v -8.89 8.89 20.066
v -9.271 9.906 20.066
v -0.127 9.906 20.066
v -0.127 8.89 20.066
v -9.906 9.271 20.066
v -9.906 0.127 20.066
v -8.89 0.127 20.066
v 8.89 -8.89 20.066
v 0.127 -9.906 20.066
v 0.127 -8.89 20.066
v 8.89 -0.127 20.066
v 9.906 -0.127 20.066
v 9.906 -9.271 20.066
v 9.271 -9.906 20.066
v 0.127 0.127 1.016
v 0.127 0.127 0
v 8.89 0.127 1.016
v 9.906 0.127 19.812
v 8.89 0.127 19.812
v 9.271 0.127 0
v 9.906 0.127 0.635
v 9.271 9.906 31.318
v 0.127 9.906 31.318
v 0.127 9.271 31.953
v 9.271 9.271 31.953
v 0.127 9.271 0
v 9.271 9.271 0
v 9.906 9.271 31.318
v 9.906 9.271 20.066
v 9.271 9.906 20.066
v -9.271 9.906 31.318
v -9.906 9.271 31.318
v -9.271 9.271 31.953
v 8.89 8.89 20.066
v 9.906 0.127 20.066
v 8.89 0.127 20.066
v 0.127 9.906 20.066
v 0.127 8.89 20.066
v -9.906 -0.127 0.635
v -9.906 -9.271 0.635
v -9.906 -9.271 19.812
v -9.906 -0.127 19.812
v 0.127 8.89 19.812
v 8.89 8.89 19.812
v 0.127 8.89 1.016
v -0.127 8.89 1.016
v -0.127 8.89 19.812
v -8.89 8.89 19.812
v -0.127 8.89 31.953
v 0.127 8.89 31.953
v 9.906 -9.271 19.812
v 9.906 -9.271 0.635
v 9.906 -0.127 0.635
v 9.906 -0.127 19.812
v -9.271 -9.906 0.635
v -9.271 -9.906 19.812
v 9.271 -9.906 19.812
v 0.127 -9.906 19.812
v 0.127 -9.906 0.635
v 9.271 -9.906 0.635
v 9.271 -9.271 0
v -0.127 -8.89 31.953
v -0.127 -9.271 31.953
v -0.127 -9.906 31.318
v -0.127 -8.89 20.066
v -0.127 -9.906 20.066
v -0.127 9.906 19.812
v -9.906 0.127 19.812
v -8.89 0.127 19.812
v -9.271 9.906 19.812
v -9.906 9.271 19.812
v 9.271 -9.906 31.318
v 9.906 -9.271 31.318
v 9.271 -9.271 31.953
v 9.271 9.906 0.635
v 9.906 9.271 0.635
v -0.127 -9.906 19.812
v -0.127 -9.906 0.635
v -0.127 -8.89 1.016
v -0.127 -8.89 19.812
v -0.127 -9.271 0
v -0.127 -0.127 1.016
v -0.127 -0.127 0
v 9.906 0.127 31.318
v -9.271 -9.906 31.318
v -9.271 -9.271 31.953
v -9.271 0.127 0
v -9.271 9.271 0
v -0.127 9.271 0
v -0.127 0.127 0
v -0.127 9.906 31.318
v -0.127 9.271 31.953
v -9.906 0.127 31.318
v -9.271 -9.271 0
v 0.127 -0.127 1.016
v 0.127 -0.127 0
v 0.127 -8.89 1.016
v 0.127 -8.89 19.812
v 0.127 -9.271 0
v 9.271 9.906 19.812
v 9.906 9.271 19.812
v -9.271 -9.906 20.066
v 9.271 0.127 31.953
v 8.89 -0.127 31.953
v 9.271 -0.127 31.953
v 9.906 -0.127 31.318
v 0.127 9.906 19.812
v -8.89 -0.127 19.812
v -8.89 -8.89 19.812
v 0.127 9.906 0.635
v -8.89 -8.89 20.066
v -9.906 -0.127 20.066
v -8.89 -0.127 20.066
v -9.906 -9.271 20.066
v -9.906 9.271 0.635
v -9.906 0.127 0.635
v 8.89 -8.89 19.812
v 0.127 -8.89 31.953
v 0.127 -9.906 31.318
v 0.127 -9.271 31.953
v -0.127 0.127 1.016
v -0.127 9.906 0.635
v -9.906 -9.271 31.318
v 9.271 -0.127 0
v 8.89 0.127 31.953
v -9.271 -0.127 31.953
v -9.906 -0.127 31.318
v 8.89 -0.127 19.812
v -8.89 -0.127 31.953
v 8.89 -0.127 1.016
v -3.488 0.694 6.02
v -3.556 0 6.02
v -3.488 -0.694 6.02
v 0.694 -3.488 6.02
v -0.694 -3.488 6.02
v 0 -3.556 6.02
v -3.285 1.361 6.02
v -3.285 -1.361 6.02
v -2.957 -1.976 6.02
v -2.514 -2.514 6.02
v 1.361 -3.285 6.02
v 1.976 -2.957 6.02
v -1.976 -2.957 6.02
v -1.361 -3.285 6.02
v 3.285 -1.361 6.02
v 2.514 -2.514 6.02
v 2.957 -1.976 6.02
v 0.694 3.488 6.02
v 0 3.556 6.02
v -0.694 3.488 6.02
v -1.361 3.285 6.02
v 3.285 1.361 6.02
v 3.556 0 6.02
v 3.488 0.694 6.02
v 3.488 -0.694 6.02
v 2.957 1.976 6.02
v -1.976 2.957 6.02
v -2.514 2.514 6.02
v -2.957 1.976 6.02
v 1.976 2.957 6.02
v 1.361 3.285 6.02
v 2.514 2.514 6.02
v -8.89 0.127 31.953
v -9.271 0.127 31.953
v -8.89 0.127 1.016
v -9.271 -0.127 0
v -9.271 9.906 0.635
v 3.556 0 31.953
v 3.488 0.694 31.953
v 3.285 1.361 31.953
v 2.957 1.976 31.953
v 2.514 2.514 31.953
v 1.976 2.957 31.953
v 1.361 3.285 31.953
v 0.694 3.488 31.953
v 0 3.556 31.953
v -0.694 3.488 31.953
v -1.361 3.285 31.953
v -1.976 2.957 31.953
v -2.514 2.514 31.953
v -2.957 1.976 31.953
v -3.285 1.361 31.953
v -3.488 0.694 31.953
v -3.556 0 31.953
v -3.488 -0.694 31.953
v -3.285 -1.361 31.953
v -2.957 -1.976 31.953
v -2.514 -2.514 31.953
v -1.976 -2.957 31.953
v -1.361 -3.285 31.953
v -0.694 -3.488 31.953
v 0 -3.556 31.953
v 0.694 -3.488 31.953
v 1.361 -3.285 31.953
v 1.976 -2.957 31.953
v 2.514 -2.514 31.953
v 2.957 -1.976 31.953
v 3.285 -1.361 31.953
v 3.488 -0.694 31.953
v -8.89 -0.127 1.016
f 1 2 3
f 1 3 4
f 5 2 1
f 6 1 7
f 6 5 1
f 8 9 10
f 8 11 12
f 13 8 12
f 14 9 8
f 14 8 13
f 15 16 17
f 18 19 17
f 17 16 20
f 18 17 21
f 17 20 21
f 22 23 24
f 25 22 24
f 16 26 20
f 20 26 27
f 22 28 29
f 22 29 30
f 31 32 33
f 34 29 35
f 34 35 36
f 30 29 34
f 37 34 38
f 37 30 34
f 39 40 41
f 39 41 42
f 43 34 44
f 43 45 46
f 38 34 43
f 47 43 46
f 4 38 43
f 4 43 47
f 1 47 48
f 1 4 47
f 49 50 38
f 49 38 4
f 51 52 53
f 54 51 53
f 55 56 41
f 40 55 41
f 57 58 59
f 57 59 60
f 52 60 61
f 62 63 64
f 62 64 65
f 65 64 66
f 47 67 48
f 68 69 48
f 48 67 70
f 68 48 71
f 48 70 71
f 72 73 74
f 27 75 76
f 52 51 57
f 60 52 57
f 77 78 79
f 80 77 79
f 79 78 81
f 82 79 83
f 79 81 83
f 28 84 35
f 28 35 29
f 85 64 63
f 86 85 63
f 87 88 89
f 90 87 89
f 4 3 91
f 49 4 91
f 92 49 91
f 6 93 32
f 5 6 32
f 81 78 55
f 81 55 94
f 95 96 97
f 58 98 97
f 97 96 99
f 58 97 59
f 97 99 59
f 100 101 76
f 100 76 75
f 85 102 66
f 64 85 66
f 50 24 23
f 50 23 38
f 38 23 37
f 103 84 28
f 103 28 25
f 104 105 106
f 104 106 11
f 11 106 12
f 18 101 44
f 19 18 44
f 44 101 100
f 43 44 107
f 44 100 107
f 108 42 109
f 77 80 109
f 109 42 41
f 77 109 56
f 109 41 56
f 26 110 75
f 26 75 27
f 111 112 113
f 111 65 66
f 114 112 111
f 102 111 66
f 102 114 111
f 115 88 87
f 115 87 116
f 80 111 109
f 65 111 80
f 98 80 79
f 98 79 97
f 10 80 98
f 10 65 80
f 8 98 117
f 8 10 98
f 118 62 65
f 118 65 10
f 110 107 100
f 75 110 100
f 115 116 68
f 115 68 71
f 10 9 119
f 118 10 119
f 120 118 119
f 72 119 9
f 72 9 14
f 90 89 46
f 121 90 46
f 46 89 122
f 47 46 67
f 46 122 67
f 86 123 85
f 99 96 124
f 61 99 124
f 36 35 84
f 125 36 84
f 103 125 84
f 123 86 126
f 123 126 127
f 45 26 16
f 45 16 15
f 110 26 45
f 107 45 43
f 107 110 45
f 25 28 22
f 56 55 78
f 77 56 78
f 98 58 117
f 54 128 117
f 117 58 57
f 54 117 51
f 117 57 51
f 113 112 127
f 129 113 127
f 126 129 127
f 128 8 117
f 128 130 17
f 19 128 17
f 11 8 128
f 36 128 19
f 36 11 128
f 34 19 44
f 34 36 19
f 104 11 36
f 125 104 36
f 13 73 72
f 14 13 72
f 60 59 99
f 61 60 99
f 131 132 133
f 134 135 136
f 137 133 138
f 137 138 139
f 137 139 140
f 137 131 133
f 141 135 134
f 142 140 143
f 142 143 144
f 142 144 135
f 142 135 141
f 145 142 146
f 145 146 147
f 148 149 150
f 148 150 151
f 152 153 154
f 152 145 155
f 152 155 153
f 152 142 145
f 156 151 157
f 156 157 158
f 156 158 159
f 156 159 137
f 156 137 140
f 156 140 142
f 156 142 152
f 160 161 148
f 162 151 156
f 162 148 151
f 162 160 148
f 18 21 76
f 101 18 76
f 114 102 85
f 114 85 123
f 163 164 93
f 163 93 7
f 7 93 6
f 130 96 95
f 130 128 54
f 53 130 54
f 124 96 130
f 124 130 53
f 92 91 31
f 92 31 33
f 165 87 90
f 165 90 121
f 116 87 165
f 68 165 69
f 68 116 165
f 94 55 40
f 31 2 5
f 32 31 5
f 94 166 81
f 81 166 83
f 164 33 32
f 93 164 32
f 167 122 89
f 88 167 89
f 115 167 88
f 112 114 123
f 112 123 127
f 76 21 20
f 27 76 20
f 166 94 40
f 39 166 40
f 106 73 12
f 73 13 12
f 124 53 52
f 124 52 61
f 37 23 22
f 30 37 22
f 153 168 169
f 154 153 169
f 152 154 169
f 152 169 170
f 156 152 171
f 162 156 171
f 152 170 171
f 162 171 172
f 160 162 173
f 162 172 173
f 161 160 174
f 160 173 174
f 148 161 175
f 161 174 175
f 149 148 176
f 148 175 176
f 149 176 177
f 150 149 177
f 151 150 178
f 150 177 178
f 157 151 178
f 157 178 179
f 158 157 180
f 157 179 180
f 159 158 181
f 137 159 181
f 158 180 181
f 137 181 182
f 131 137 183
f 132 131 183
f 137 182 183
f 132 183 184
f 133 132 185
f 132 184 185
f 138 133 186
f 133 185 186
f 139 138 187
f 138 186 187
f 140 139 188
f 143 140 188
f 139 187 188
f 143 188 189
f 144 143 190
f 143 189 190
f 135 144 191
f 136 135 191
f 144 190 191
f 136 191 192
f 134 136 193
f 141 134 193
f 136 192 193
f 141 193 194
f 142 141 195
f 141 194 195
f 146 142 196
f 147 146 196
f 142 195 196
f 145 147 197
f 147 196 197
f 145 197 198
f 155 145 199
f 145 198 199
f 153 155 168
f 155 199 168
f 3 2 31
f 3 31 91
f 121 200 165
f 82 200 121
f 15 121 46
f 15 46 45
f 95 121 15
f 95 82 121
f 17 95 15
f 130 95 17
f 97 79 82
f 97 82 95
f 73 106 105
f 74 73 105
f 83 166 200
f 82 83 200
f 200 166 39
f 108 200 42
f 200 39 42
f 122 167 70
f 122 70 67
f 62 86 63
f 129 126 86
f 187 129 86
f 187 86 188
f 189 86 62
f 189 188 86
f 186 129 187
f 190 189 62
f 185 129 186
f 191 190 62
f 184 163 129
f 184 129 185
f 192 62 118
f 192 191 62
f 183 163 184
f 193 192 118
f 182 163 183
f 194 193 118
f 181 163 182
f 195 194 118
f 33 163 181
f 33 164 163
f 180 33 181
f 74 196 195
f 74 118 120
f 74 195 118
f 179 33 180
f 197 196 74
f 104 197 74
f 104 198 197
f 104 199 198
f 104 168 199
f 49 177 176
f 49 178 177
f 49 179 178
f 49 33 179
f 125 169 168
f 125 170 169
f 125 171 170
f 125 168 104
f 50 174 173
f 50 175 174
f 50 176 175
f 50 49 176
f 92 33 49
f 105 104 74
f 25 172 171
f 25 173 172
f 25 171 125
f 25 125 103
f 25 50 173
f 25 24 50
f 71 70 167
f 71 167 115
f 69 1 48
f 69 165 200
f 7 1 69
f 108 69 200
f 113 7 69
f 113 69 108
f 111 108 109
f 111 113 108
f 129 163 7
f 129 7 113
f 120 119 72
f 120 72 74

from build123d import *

# Parameters (mm, degrees)
F0_W            = 19.812
F0_H            = 19.812
F1_DEPTH        = 31.9532
F2_R            = 3.556
F3_DEPTH        = 25.9334
F4_T1_DEPTH     = 0.8065583261
F4_T3_DEPTH     = 0.8065583261
F4_T5_DEPTH     = 0.8065583261
F4_T7_DEPTH     = 0.8065583261
F4_T9_DEPTH     = 0.8065583261
F4_T11_DEPTH    = 0.8065583261
F4_T13_DEPTH    = 0.8065583261
F4_T15_DEPTH    = 0.8065583261
F4_T17_DEPTH    = 35.2192373947
F4_T19_DEPTH    = 23.0780373947
F4_T21_DEPTH    = 23.0780373947
F5_W            = 0.254
F5_H            = 11.8872
F5_H_2          = 0.254
F5_W_2          = 9.779
F5_H_3          = 19.812
F6_DEPTH        = 1.016
F6_COPIES_COUNT = 4
F7_W            = 0.254
F7_H            = 8.763
F7_H_2          = 0.254
F7_W_2          = 8.763
F8_DEPTH        = 1.016


# Not quite as in the source:
# - a fillet or chamfer that OpenCascade refuses, or shapes differently, is made with other operations: its cross-section is extruded or revolved along the edge and cut away or added
# - a pattern or mirror of a feature is missing from the dataset's text; its kind, count and spacing are read off the source's solid


with BuildPart() as f1:
    # F0 (on Top) → F1 (new body)
    with BuildSketch(Plane.XY):
        Rectangle(F0_W, F0_H)
    extrude(amount=F1_DEPTH)

    # F2 (on face) → F3 (cut)
    with BuildSketch(Plane.XY.offset(31.9532)):
        Circle(F2_R)
    extrude(amount=-F3_DEPTH, mode=Mode.SUBTRACT)

    # F4: chamfer of 0.635 on 12 edges, made by hand

    # F4_s2 → F4_t1 (cut)
    with BuildSketch(Plane(origin=(-6.1806666667, 6.1806666667, -6.1806666667), x_dir=(-0.7071067812, -0.7071067812, 0), z_dir=(-0.5773502692, 0.5773502692, -0.5773502692))):
        Polygon((-0.4490128061, 8.3474527951), (0, 7.5697398018), (0.4490128061, 8.3474527951), align=None)
    extrude(amount=F4_T1_DEPTH, mode=Mode.SUBTRACT)

    # F4_s4 → F4_t3 (cut)
    with BuildSketch(Plane(origin=(-16.8317333333, 16.8317333333, 16.8317333333), x_dir=(-0.7071067812, -0.7071067812, 0), z_dir=(-0.5773502692, 0.5773502692, 0.5773502692))):
        Polygon((-0.4490128061, 17.7422257546), (0, 18.5199387479), (0.4490128061, 17.7422257546), align=None)
    extrude(amount=F4_T3_DEPTH, mode=Mode.SUBTRACT)

    # F4_s6 → F4_t5 (cut)
    with BuildSketch(Plane(origin=(-6.1806666667, -6.1806666667, -6.1806666667), x_dir=(0.7071067812, -0.7071067812, 0), z_dir=(-0.5773502692, -0.5773502692, -0.5773502692))):
        Polygon((0.4490128061, 8.3474527951), (0, 7.5697398018), (-0.4490128061, 8.3474527951), align=None)
    extrude(amount=F4_T5_DEPTH, mode=Mode.SUBTRACT)

    # F4_s8 → F4_t7 (cut)
    with BuildSketch(Plane(origin=(-16.8317333333, -16.8317333333, 16.8317333333), x_dir=(0.7071067812, -0.7071067812, 0), z_dir=(-0.5773502692, -0.5773502692, 0.5773502692))):
        Polygon((0.4490128061, 17.7422257546), (0, 18.5199387479), (-0.4490128061, 17.7422257546), align=None)
    extrude(amount=F4_T7_DEPTH, mode=Mode.SUBTRACT)

    # F4_s10 → F4_t9 (cut)
    with BuildSketch(Plane(origin=(6.1806666667, -6.1806666667, -6.1806666667), x_dir=(0.7071067812, 0.7071067812, 0), z_dir=(0.5773502692, -0.5773502692, -0.5773502692))):
        Polygon((0.4490128061, 8.3474527951), (-0.4490128061, 8.3474527951), (0, 7.5697398018), align=None)
    extrude(amount=F4_T9_DEPTH, mode=Mode.SUBTRACT)

    # F4_s12 → F4_t11 (cut)
    with BuildSketch(Plane(origin=(16.8317333333, -16.8317333333, 16.8317333333), x_dir=(0.7071067812, 0.7071067812, 0), z_dir=(0.5773502692, -0.5773502692, 0.5773502692))):
        Polygon((0.4490128061, 17.7422257546), (-0.4490128061, 17.7422257546), (0, 18.5199387479), align=None)
    extrude(amount=F4_T11_DEPTH, mode=Mode.SUBTRACT)

    # F4_s14 → F4_t13 (cut)
    with BuildSketch(Plane(origin=(6.1806666667, 6.1806666667, -6.1806666667), x_dir=(-0.7071067812, 0.7071067812, 0), z_dir=(0.5773502692, 0.5773502692, -0.5773502692))):
        Polygon((-0.4490128061, 8.3474527951), (0.4490128061, 8.3474527951), (0, 7.5697398018), align=None)
    extrude(amount=F4_T13_DEPTH, mode=Mode.SUBTRACT)

    # F4_s16 → F4_t15 (cut)
    with BuildSketch(Plane(origin=(16.8317333333, 16.8317333333, 16.8317333333), x_dir=(-0.7071067812, 0.7071067812, 0), z_dir=(0.5773502692, 0.5773502692, 0.5773502692))):
        Polygon((-0.4490128061, 17.7422257546), (0.4490128061, 17.7422257546), (0, 18.5199387479), align=None)
    extrude(amount=F4_T15_DEPTH, mode=Mode.SUBTRACT)

    # F4_s18 → F4_t17 (cut)
    with BuildSketch(Plane.XY.offset(-1.6330186974)):
        Polygon((-9.271, 9.906), (-9.906, 9.271), (-9.906, 9.906), align=None)
        Polygon((-9.271, -9.906), (-9.906, -9.271), (-9.906, -9.906), align=None)
        Polygon((9.906, -9.271), (9.271, -9.906), (9.906, -9.906), align=None)
        Polygon((9.906, 9.271), (9.271, 9.906), (9.906, 9.906), align=None)
    extrude(amount=F4_T17_DEPTH, mode=Mode.SUBTRACT)

    # F4_s20 → F4_t19 (cut)
    with BuildSketch(Plane.XZ.offset(-11.5390186974)):
        Polygon((9.906, 31.3182), (9.271, 31.9532), (9.906, 31.9532), align=None)
        Polygon((-9.271, 31.9532), (-9.906, 31.3182), (-9.906, 31.9532), align=None)
        Polygon((9.906, 0.635), (9.271, 0), (9.906, 0), align=None)
        Polygon((-9.271, 0), (-9.906, 0.635), (-9.906, 0), align=None)
    extrude(amount=F4_T19_DEPTH, mode=Mode.SUBTRACT)

    # F4_s22 → F4_t21 (cut)
    with BuildSketch(Plane.YZ.offset(-11.5390186974)):
        Polygon((-9.906, 31.3182), (-9.271, 31.9532), (-9.906, 31.9532), align=None)
        Polygon((9.906, 31.3182), (9.271, 31.9532), (9.906, 31.9532), align=None)
        Polygon((9.906, 0.635), (9.271, 0), (9.906, 0), align=None)
        Polygon((-9.906, 0.635), (-9.271, 0), (-9.906, 0), align=None)
    extrude(amount=F4_T21_DEPTH, mode=Mode.SUBTRACT)

    # F5 (on face) → F6 (cut)
    with BuildSketch(Plane.XZ.offset(9.906)):
        with Locations((0, 26.0096)):
            Rectangle(F5_W, F5_H)
        with Locations((0, 19.939)):
            Rectangle(F5_W, F5_H_2)
        with Locations((-5.0165, 19.939)):
            Rectangle(F5_W_2, F5_H_2)
        with Locations((5.0165, 19.939)):
            Rectangle(F5_W_2, F5_H_2)
        with Locations((0, 9.906)):
            Rectangle(F5_W, F5_H_3)
    f6 = extrude(amount=-F6_DEPTH, mode=Mode.SUBTRACT)

    # F6_copies: F6 ×4 about axis
    f6_copies_axis = Axis((0, 0, 0), (0, 0, 1))
    for i in range(1, F6_COPIES_COUNT):
        add(f6.rotate(f6_copies_axis, i * 360 / F6_COPIES_COUNT), mode=Mode.SUBTRACT)

    # F7 (on face) → F8 (cut)
    with BuildSketch(Plane(origin=(0, 0, 0), x_dir=(1, 0, 0), z_dir=(0, 0, -1))):
        with Locations((0, 4.5085)):
            Rectangle(F7_W, F7_H)
        Rectangle(F7_W, F7_H_2)
        with Locations((-4.5085, 0)):
            Rectangle(F7_W_2, F7_H_2)
        with Locations((4.5085, 0)):
            Rectangle(F7_W_2, F7_H_2)
        with Locations((0, -4.5085)):
            Rectangle(F7_W, F7_H)
    extrude(amount=-F8_DEPTH, mode=Mode.SUBTRACT)


solid = f1.part
